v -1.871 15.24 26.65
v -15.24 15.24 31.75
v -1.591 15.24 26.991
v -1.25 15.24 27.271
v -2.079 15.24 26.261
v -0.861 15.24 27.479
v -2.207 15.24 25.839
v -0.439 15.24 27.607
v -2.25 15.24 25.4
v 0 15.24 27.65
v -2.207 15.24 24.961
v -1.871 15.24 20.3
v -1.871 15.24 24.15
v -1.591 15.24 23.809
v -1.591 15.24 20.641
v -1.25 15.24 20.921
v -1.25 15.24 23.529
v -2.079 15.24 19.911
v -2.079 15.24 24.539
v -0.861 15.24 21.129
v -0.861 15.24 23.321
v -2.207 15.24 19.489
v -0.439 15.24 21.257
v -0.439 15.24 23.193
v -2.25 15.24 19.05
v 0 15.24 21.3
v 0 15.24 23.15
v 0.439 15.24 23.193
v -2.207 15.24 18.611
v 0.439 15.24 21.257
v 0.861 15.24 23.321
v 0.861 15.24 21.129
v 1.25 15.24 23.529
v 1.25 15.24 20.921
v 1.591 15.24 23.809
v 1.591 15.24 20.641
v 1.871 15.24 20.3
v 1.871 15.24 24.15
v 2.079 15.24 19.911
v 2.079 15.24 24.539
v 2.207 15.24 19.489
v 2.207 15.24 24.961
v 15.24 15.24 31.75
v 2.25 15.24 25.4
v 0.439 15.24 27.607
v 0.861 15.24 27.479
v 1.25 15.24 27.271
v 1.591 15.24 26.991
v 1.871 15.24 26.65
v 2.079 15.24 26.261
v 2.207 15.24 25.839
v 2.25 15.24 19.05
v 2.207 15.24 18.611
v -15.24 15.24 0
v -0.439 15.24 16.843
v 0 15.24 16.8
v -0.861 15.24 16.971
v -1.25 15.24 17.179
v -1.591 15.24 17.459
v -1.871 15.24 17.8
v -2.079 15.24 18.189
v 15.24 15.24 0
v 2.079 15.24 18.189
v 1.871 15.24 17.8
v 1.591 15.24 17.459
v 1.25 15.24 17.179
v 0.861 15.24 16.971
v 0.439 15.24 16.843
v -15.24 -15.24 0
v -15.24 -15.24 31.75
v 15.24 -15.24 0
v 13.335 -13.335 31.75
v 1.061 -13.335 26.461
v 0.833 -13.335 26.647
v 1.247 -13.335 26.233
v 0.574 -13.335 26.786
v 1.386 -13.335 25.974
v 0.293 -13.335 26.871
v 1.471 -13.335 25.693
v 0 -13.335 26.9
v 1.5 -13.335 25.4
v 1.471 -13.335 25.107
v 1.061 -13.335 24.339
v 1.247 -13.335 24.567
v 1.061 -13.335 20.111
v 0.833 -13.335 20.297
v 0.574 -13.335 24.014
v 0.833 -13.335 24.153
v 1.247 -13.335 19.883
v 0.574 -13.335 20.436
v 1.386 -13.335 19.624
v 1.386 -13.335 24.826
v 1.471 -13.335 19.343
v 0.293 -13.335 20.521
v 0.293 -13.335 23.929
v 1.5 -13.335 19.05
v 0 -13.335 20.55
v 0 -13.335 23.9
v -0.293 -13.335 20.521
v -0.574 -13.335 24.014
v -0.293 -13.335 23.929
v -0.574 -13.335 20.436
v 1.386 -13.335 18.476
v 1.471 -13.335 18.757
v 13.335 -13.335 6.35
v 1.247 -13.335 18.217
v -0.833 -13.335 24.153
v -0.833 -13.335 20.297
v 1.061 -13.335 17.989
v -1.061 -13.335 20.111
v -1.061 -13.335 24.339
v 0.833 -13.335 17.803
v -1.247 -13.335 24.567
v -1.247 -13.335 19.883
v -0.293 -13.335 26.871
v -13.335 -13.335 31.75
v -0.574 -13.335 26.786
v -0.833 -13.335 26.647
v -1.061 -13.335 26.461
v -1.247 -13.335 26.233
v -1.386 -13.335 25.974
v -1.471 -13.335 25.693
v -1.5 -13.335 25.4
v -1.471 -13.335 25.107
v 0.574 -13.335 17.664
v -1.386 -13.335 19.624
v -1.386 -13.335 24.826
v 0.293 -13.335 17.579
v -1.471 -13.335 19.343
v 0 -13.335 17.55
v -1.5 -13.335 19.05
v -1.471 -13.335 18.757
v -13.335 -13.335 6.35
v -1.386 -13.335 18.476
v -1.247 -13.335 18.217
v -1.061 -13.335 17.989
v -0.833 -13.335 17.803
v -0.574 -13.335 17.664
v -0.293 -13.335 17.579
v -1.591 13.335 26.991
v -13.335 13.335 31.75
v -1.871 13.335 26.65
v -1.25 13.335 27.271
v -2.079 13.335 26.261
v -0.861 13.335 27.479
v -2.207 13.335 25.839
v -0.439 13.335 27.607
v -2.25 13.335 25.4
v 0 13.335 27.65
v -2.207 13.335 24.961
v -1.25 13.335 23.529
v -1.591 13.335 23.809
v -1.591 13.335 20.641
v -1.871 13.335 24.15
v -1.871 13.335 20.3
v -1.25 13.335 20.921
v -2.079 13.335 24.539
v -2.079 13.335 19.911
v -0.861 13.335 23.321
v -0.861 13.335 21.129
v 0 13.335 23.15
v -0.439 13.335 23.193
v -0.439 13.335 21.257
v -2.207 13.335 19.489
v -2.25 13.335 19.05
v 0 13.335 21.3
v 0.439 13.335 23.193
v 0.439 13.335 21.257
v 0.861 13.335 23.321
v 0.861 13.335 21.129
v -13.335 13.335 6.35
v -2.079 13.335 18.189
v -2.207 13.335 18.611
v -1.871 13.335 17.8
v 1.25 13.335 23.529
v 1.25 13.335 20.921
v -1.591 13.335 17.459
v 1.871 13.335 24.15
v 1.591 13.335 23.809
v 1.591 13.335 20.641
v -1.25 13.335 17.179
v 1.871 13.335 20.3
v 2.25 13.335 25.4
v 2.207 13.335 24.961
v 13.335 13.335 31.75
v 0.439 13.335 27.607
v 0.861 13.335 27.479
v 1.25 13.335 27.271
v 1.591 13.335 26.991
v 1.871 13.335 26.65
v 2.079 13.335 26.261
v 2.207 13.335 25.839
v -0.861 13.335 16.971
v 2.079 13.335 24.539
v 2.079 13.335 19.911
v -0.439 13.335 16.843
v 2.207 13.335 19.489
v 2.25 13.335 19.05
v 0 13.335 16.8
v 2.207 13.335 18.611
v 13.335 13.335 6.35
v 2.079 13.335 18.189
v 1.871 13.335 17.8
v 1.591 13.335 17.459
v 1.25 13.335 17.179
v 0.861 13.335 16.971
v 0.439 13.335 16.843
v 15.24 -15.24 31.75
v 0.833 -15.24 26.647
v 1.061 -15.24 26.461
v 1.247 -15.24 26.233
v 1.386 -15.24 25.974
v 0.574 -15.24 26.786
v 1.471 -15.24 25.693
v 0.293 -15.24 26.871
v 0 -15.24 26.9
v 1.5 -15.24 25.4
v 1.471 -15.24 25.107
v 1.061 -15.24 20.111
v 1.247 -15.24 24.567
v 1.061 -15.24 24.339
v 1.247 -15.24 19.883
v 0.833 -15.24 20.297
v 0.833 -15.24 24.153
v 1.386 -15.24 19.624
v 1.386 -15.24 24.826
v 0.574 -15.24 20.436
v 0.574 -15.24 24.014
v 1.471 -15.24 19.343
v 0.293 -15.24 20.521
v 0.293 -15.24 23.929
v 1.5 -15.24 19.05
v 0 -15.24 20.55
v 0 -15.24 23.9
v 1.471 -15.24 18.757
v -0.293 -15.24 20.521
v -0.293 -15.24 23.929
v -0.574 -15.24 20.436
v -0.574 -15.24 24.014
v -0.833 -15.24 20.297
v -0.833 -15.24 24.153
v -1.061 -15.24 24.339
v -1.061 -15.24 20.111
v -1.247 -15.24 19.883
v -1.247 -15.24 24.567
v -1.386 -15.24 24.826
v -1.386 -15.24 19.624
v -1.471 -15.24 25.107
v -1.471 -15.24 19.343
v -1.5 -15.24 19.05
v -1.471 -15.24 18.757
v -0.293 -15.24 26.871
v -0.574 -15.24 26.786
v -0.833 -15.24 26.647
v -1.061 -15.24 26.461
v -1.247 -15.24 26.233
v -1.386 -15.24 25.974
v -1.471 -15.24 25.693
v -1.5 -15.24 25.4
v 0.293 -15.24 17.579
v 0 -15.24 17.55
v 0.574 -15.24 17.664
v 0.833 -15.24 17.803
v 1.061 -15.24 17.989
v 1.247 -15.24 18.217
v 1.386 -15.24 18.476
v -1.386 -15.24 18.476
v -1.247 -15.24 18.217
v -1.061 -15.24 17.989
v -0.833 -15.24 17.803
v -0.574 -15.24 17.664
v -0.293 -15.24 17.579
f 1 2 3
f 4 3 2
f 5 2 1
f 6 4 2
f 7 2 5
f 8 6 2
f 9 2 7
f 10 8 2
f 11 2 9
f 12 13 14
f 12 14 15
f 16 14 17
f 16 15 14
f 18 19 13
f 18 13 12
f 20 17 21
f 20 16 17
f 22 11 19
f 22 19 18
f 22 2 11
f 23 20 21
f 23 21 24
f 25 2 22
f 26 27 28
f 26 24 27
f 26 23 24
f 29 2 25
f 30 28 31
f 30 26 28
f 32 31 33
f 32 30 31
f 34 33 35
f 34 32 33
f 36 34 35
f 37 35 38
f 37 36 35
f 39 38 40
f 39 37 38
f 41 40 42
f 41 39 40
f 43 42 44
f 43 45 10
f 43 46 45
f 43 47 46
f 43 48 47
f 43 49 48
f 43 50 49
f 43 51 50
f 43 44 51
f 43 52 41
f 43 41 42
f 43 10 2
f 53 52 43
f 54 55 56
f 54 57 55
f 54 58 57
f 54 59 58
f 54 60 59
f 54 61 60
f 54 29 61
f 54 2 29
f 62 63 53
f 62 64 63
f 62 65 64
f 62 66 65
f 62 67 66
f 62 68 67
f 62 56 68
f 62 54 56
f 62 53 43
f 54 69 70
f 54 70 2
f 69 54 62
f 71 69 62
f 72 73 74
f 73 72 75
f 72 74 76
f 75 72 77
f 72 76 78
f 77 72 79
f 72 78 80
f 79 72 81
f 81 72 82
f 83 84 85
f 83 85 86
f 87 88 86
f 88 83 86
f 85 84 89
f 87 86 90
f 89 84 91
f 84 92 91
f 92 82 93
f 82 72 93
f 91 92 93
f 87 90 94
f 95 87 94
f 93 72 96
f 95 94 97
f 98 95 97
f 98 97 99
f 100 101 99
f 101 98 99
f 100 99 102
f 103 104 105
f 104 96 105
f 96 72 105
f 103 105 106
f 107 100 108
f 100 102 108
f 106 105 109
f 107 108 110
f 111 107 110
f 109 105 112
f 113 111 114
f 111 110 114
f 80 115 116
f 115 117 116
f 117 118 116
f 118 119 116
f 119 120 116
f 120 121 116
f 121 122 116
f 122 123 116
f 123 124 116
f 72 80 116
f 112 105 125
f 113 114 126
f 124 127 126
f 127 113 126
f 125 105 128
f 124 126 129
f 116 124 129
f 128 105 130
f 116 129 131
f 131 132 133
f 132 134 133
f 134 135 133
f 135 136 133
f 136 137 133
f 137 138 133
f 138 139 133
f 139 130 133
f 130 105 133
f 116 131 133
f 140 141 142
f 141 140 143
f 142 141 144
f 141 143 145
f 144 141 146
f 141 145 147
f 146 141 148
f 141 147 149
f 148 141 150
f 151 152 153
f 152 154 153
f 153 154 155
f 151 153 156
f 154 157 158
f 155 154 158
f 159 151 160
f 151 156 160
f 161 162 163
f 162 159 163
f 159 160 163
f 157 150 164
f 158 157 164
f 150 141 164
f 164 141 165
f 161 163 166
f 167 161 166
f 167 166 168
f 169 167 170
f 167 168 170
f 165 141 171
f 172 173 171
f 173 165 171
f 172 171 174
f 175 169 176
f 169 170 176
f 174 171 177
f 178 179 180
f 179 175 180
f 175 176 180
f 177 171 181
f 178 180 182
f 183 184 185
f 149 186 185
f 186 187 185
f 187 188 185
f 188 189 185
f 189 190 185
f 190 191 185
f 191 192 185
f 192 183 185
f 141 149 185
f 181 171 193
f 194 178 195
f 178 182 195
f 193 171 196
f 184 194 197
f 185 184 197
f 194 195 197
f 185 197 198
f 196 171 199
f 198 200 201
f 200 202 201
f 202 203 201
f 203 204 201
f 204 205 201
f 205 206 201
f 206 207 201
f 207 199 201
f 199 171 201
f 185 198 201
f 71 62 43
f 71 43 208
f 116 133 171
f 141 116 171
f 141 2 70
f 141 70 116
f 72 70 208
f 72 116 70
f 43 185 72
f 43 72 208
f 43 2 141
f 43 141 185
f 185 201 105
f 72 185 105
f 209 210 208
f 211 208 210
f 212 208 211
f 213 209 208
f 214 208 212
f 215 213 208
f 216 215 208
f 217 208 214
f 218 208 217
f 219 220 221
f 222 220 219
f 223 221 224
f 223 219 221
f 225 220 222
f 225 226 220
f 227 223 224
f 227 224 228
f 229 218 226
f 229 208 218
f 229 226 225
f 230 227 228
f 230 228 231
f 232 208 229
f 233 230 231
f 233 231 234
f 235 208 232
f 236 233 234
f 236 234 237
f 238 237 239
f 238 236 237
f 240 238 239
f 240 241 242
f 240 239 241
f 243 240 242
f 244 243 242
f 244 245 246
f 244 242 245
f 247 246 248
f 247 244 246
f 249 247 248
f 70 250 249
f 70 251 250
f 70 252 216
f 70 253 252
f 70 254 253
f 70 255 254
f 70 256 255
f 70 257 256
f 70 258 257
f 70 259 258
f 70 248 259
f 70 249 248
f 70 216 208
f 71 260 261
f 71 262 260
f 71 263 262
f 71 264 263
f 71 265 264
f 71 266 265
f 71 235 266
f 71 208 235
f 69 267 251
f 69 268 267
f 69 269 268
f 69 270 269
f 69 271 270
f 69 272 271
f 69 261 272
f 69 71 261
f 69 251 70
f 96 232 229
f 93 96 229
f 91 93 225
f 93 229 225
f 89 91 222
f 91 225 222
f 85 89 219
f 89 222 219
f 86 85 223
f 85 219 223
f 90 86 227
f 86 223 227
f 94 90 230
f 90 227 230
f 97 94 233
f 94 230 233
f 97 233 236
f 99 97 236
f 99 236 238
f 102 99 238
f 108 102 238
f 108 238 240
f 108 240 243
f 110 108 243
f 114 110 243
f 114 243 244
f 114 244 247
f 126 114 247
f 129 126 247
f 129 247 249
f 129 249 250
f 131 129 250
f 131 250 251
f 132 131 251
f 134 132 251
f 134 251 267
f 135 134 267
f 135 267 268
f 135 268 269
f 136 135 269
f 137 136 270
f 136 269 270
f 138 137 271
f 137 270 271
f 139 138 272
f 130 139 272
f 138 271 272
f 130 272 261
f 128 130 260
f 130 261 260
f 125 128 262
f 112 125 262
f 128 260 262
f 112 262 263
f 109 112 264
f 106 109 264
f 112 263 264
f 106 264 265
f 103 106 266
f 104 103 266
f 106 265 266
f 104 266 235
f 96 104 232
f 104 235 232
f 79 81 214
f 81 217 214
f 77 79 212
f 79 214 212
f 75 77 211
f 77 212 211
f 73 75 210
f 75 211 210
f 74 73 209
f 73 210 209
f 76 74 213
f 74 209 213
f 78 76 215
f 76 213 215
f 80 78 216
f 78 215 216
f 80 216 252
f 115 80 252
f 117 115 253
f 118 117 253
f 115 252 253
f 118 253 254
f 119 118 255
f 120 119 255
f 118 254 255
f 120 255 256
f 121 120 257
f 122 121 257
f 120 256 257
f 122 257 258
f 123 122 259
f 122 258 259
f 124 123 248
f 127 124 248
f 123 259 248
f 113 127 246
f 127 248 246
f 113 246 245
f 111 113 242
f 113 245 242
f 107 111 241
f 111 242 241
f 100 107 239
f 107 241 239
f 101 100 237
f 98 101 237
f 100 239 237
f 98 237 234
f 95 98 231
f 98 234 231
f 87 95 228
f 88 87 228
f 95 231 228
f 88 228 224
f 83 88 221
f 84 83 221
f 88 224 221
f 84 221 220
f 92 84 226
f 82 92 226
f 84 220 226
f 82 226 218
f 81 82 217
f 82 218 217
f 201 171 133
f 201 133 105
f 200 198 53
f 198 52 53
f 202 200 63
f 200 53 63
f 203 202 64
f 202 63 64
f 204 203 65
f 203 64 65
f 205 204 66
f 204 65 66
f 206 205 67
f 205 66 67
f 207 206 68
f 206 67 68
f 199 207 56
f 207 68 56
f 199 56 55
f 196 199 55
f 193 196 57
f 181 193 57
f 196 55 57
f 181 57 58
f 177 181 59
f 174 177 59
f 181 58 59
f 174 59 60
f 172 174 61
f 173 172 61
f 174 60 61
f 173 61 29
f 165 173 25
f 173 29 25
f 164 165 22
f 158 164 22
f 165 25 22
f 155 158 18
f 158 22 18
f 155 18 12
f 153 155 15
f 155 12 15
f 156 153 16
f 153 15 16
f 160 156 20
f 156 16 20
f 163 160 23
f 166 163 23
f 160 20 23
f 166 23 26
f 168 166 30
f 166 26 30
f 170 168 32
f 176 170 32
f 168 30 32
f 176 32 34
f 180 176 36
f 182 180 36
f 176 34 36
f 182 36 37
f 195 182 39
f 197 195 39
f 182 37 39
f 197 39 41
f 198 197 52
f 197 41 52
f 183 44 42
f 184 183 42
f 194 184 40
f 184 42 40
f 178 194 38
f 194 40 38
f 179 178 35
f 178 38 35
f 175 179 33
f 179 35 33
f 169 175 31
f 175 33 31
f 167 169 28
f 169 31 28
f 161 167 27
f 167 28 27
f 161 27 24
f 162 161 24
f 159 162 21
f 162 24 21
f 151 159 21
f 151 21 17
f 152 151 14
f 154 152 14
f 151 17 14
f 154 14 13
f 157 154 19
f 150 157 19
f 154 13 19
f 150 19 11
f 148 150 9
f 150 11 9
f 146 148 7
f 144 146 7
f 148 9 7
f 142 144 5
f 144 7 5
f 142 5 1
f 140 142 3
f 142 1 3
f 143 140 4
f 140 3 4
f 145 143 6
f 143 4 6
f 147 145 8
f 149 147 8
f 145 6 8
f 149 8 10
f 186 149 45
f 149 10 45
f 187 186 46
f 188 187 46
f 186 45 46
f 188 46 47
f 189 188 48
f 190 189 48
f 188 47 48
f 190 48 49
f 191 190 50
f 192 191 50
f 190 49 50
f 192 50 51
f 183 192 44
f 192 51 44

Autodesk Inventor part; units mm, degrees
ref_plane "YZ Plane" through (0, 0, 0) normal (1, 0, 0) x (0, 1, 0)
ref_plane "XZ Plane" through (0, 0, 0) normal (0, 1, 0) x (-1, 0, 0)
ref_plane "XY Plane" through (0, 0, 0) normal (0, 0, 1) x (1, 0, 0)
sketch "Sketch1" plane through (0, 0, 0) normal (0, 0, 1) x (1, 0, 0)
  line L0 (13.335, -13.335) -> (-13.335, -13.335)
  line L1 (-13.335, -13.335) -> (-13.335, 13.335)
  line L2 (-13.335, 13.335) -> (13.335, 13.335)
  line L3 (13.335, 13.335) -> (13.335, -13.335)
  line L4 (13.335, -13.335) -> (-13.335, 13.335) construction
  line L5 (-13.335, -13.335) -> (13.335, 13.335) construction
  line L6 (15.24, -15.24) -> (-15.24, -15.24)
  line L7 (-15.24, -15.24) -> (-15.24, 15.24)
  line L8 (-15.24, 15.24) -> (15.24, 15.24)
  line L9 (15.24, 15.24) -> (15.24, -15.24)
  line L10 (15.24, -15.24) -> (-15.24, 15.24) construction
  line L11 (-15.24, -15.24) -> (15.24, 15.24) construction
  point P0 (0, 0)
  dimension "d0" = 26.67
  dimension "d1" = 26.67
  dimension "d2" = 30.48
  dimension "d3" = 30.48
extrude "Extrusion1" add sketch "Sketch1" along normal blind 31.75
extrude "Extrusion2" add sketch "Sketch1" along normal blind 6.35 contours L0 L1 L2 L3
sketch "Sketch2" plane through (-15.24, 15.24, 0) normal (0, 1, 0) x (1, 0, 0)
  line L0 (1.905, -6.35) -> (28.575, -6.35) projected
  line L1 (30.48, 0) -> (0, 0) projected
  line L2 (0, 0) -> (0, -31.75) projected
  line L3 (30.48, -31.75) -> (0, -31.75) projected
  line L4 (30.48, 0) -> (30.48, -31.75) projected
  line L5 (15.24, 0) -> (15.24, -31.75) construction
  line L6 (28.575, -31.75) -> (1.905, -31.75) construction
  circle A0 centre (15.24, -19.05) radius 2.25
  circle A1 centre (15.24, -25.4) radius 2.25
  dimension "d8" = 4.5
  dimension "d9" = 12.7
  dimension "d10" = 4.5
  dimension "d11" = 6.35
extrude "Extrusion3" cut sketch "Sketch2" against normal up to surface (28.575 mm away) contours A0 | A1
sketch "Sketch3" plane through (-15.24, -15.24, 0) normal (0, -1, 0) x (1, 0, 0)
  circle A0 centre (15.24, 19.05) radius 2.25 projected
  line L0 (0, 0) -> (30.48, 0) projected
  line L1 (30.48, 0) -> (30.48, 31.75) projected
  line L2 (0, 31.75) -> (30.48, 31.75) projected
  line L3 (0, 0) -> (0, 31.75) projected
  circle A1 centre (15.24, 25.4) radius 2.25 projected
  circle A2 centre (15.24, 25.4) radius 1.5
  circle A3 centre (15.24, 19.05) radius 1.5
  point P0 (15.24, 0)
  dimension "d14" = 3
  dimension "d15" = 3
extrude "Extrusion4" cut sketch "Sketch3" against normal up to surface (28.575 mm away) contours A2 | A3
properties part number "CS_Climb_Inner_Tube_End_Cap"
